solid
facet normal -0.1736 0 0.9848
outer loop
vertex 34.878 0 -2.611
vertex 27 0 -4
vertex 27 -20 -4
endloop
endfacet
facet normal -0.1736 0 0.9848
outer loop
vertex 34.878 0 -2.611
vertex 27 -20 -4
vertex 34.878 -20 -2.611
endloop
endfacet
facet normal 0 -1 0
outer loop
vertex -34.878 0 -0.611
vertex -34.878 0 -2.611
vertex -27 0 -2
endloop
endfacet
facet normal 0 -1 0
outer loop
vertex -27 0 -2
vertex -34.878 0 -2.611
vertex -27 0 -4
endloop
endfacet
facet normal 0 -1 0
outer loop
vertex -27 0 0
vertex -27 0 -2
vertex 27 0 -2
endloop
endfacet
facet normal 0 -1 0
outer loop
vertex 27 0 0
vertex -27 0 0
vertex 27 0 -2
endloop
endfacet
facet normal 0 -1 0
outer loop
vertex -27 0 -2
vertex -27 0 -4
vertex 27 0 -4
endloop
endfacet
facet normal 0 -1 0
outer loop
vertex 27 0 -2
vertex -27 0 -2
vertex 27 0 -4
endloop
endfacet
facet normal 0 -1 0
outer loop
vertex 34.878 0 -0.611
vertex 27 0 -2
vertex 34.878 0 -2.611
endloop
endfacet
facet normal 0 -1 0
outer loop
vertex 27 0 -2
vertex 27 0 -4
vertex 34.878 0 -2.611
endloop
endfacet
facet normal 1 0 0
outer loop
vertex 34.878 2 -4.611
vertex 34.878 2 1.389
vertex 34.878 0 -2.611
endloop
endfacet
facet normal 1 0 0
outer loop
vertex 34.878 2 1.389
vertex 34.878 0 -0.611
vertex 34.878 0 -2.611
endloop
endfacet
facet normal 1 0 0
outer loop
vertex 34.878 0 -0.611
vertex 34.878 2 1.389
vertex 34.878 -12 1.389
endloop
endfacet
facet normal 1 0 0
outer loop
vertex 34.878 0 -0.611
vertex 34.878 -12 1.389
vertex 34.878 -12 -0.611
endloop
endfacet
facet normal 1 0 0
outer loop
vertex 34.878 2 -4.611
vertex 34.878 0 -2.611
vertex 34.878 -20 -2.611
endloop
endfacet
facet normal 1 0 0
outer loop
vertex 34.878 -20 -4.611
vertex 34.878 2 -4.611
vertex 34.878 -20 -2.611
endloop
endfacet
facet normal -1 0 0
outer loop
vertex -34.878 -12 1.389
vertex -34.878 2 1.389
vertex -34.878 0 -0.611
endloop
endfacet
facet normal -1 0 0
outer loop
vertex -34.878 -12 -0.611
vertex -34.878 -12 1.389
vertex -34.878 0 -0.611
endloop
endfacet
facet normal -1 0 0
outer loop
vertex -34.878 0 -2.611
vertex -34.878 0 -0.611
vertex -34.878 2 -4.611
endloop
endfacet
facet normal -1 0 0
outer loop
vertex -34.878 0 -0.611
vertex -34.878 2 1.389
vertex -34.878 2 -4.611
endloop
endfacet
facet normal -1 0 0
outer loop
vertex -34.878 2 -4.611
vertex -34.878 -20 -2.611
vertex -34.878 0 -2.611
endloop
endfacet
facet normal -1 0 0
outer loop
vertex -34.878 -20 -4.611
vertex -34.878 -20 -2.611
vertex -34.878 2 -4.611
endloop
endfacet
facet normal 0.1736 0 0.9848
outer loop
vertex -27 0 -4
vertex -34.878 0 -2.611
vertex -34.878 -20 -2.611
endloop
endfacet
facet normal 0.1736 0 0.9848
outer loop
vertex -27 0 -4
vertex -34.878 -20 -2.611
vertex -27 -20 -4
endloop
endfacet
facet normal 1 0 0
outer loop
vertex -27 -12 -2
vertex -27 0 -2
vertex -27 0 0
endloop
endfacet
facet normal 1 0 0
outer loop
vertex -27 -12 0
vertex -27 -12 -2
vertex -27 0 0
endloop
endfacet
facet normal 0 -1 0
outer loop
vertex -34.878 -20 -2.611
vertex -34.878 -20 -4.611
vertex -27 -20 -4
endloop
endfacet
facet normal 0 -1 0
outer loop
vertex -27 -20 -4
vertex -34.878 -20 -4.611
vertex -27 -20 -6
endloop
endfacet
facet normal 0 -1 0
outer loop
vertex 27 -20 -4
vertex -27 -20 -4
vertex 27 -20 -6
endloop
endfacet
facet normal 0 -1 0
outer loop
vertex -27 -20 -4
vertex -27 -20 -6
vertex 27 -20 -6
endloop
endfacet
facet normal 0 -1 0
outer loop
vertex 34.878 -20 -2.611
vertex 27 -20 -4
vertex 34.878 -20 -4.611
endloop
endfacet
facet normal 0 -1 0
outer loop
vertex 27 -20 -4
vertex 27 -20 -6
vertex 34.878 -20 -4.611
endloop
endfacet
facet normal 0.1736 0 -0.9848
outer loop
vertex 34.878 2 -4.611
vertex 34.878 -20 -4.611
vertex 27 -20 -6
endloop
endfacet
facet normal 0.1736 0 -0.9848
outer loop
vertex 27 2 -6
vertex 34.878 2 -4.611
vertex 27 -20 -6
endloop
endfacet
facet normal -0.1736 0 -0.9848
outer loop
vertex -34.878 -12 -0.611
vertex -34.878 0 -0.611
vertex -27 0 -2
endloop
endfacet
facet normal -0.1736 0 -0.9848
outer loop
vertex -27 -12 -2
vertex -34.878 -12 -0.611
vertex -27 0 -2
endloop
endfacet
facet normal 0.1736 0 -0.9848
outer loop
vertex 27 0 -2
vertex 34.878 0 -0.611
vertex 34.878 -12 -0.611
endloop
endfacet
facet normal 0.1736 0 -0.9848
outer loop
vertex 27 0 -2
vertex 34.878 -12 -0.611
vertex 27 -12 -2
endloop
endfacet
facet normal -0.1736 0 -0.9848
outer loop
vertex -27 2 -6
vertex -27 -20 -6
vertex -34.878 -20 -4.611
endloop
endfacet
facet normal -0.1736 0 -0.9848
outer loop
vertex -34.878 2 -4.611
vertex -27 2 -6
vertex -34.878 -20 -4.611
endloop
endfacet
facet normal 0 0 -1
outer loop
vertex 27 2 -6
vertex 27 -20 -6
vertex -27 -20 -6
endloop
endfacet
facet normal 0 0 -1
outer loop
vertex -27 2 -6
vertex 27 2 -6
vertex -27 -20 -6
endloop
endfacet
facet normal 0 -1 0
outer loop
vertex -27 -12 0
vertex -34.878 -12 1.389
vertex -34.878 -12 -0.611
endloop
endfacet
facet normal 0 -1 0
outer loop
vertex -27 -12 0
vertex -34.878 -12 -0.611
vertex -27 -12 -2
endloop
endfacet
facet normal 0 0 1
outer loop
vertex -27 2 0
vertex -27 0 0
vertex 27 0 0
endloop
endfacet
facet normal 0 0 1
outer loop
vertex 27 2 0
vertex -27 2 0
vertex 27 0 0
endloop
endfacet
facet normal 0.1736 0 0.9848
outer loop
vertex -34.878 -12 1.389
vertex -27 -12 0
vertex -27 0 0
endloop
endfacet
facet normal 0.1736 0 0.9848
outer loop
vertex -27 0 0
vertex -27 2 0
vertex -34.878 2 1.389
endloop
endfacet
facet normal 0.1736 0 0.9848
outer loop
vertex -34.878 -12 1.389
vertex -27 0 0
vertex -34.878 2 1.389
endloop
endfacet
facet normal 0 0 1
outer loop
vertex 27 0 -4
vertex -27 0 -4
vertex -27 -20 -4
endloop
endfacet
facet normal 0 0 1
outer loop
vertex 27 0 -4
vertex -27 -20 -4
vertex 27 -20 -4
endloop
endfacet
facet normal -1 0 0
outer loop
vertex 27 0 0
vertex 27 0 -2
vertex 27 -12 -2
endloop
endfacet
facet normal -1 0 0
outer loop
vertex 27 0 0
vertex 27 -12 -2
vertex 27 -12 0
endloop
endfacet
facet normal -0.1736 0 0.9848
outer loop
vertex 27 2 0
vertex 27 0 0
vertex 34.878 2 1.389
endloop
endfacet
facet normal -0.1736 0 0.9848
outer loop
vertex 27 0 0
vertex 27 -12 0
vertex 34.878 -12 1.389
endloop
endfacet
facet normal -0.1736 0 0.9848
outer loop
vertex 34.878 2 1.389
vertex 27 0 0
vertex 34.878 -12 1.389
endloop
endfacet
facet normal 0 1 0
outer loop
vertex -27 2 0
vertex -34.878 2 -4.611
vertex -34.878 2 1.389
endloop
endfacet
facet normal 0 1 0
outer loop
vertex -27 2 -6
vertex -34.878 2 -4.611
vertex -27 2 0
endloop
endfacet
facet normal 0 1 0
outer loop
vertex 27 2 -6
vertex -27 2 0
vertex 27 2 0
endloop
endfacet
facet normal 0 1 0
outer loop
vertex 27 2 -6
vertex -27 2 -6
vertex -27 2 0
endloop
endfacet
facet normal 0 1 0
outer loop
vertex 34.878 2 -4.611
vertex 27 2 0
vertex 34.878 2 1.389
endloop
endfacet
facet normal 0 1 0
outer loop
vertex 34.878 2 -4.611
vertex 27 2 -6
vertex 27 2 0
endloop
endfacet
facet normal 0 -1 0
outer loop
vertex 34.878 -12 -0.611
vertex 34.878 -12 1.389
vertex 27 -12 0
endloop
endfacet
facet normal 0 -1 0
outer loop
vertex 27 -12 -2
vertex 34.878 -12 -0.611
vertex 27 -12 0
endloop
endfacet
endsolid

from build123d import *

# Parameters (mm, degrees)
BOSS_EXTRUDE1_DEPTH = 2
BOSS_EXTRUDE5_DEPTH = 22
BOSS_EXTRUDE6_DEPTH = 12


with BuildPart() as part:
    # Sketch1 → Boss-Extrude1 (new body)
    with BuildSketch(Plane(origin=(0, 0, 0), x_dir=(1, 0, 0), z_dir=(0, 1, 0))):
        Polygon((-27, 0), (27, 0), (34.878462024, -1.389185421), (34.878462024, 4.610814579), (27, 6), (-27, 6), (-34.878462024, 4.610814579), (-34.878462024, -1.389185421), align=None)
    extrude(amount=BOSS_EXTRUDE1_DEPTH)

    # Sketch3 → Boss-Extrude5 (add)
    with BuildSketch(Plane(origin=(0, 2, 0), x_dir=(1, 0, 0), z_dir=(0, 1, 0))):
        Polygon((-27, 4), (27, 4), (34.878462024, 2.610814579), (34.878462024, 4.610814579), (27, 6), (-27, 6), (-34.878462024, 4.610814579), (-34.878462024, 2.610814579), align=None)
    extrude(amount=-BOSS_EXTRUDE5_DEPTH)

    # Sketch8 → Boss-Extrude6 (add)
    with BuildSketch(Plane.XZ):
        Polygon((-34.878462024, 1.389185421), (-34.878462024, -0.610814579), (-27, -2), (-27, 0), align=None)
        Polygon((27, 0), (34.878462024, 1.389185421), (34.878462024, -0.610814579), (27, -2), align=None)
    extrude(amount=BOSS_EXTRUDE6_DEPTH)


solid = part.part
